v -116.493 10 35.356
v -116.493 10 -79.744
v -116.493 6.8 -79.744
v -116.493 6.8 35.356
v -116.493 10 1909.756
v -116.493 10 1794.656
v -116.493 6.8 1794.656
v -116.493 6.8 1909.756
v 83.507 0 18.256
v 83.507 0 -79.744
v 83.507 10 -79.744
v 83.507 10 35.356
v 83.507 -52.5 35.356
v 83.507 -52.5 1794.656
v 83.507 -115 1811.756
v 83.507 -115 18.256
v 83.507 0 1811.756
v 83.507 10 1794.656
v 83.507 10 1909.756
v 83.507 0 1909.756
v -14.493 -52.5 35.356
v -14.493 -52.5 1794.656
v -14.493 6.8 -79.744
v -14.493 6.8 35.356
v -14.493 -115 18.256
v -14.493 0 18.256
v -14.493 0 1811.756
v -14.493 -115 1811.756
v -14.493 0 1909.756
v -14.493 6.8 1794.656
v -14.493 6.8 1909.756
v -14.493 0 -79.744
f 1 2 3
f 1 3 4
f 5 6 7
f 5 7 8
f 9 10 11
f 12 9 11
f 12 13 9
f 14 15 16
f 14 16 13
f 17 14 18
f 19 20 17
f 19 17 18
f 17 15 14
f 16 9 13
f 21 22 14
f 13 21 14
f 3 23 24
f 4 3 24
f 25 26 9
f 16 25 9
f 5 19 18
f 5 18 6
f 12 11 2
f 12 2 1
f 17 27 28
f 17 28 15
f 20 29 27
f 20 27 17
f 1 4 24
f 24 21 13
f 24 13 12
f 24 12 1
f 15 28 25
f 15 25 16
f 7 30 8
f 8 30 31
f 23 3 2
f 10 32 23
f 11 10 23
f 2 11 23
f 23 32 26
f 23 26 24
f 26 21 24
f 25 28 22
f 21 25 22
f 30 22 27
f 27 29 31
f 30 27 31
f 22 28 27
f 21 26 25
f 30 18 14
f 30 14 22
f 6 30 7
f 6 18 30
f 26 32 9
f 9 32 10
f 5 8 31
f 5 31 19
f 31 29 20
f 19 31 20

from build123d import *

# Parameters (mm, degrees)
SKETCH_2_W      = 98
SKETCH_2_H      = 98
EXTRUDE_1_DEPTH = 10
SKETCH_3_W      = 98
SKETCH_3_H      = 125
EXTRUDE_2_DEPTH = 10
SKETCH_4_W      = 98
SKETCH_4_H      = 62.5
EXTRUDE_3_DEPTH = 886.75
SKETCH_5_W      = 98
SKETCH_5_H      = 62.5
EXTRUDE_4_DEPTH = 7.1
SKETCH_6_W      = 98
SKETCH_6_H      = 62.5
EXTRUDE_5_DEPTH = 7.1
SKETCH_9_W      = 115.1
SKETCH_9_H      = 3.2
EXTRUDE_6_DEPTH = 102


with BuildPart() as part:
    # 草图2 → 凸台-拉伸1 (new body)
    with BuildSketch(Plane(origin=(0, 0, 0), x_dir=(1, 0, 0), z_dir=(0, 1, 0))):
        with Locations((34.507061985, 30.744472309)):
            Rectangle(SKETCH_2_W, SKETCH_2_H)
    extrude(amount=EXTRUDE_1_DEPTH)

    # 草图3 → 凸台-拉伸2 (add)
    with BuildSketch(Plane.XY.offset(18.255527691)):
        with Locations((34.507061985, -52.5)):
            Rectangle(SKETCH_3_W, SKETCH_3_H)
    extrude(amount=EXTRUDE_2_DEPTH)

    # 草图4 → 凸台-拉伸3 (add)
    with BuildSketch(Plane.XY.offset(28.255527691)):
        with Locations((34.507061985, -83.75)):
            Rectangle(SKETCH_4_W, SKETCH_4_H)
    extrude(amount=EXTRUDE_3_DEPTH)

    # 镜向4: part across plane


with BuildPart() as part_1:
    add(part.part)
    add(part.part.mirror(Plane.XY.offset(915.005527691)))

    # 草图5 → 凸台-拉伸4 (add)
    with BuildSketch(Plane.XY.offset(28.255527691)):
        with Locations((34.507061985, -21.25)):
            Rectangle(SKETCH_5_W, SKETCH_5_H)
    extrude(amount=EXTRUDE_4_DEPTH)

    # 草图6 → 凸台-拉伸5 (add)
    with BuildSketch(Plane(origin=(0, 0, 1801.755527691), x_dir=(-1, 0, 0), z_dir=(0, 0, -1))):
        with Locations((-34.507061985, -21.25)):
            Rectangle(SKETCH_6_W, SKETCH_6_H)
    extrude(amount=EXTRUDE_5_DEPTH)

    # 草图9 → 凸台-拉伸6 (add)
    with BuildSketch(Plane.ZY.offset(14.492938015)):
        with Locations((-22.194472309, 8.4)):
            Rectangle(SKETCH_9_W, SKETCH_9_H)
        with Locations((1852.205527691, 8.4)):
            Rectangle(SKETCH_9_W, SKETCH_9_H)
    extrude(amount=EXTRUDE_6_DEPTH)


solid = part_1.part
